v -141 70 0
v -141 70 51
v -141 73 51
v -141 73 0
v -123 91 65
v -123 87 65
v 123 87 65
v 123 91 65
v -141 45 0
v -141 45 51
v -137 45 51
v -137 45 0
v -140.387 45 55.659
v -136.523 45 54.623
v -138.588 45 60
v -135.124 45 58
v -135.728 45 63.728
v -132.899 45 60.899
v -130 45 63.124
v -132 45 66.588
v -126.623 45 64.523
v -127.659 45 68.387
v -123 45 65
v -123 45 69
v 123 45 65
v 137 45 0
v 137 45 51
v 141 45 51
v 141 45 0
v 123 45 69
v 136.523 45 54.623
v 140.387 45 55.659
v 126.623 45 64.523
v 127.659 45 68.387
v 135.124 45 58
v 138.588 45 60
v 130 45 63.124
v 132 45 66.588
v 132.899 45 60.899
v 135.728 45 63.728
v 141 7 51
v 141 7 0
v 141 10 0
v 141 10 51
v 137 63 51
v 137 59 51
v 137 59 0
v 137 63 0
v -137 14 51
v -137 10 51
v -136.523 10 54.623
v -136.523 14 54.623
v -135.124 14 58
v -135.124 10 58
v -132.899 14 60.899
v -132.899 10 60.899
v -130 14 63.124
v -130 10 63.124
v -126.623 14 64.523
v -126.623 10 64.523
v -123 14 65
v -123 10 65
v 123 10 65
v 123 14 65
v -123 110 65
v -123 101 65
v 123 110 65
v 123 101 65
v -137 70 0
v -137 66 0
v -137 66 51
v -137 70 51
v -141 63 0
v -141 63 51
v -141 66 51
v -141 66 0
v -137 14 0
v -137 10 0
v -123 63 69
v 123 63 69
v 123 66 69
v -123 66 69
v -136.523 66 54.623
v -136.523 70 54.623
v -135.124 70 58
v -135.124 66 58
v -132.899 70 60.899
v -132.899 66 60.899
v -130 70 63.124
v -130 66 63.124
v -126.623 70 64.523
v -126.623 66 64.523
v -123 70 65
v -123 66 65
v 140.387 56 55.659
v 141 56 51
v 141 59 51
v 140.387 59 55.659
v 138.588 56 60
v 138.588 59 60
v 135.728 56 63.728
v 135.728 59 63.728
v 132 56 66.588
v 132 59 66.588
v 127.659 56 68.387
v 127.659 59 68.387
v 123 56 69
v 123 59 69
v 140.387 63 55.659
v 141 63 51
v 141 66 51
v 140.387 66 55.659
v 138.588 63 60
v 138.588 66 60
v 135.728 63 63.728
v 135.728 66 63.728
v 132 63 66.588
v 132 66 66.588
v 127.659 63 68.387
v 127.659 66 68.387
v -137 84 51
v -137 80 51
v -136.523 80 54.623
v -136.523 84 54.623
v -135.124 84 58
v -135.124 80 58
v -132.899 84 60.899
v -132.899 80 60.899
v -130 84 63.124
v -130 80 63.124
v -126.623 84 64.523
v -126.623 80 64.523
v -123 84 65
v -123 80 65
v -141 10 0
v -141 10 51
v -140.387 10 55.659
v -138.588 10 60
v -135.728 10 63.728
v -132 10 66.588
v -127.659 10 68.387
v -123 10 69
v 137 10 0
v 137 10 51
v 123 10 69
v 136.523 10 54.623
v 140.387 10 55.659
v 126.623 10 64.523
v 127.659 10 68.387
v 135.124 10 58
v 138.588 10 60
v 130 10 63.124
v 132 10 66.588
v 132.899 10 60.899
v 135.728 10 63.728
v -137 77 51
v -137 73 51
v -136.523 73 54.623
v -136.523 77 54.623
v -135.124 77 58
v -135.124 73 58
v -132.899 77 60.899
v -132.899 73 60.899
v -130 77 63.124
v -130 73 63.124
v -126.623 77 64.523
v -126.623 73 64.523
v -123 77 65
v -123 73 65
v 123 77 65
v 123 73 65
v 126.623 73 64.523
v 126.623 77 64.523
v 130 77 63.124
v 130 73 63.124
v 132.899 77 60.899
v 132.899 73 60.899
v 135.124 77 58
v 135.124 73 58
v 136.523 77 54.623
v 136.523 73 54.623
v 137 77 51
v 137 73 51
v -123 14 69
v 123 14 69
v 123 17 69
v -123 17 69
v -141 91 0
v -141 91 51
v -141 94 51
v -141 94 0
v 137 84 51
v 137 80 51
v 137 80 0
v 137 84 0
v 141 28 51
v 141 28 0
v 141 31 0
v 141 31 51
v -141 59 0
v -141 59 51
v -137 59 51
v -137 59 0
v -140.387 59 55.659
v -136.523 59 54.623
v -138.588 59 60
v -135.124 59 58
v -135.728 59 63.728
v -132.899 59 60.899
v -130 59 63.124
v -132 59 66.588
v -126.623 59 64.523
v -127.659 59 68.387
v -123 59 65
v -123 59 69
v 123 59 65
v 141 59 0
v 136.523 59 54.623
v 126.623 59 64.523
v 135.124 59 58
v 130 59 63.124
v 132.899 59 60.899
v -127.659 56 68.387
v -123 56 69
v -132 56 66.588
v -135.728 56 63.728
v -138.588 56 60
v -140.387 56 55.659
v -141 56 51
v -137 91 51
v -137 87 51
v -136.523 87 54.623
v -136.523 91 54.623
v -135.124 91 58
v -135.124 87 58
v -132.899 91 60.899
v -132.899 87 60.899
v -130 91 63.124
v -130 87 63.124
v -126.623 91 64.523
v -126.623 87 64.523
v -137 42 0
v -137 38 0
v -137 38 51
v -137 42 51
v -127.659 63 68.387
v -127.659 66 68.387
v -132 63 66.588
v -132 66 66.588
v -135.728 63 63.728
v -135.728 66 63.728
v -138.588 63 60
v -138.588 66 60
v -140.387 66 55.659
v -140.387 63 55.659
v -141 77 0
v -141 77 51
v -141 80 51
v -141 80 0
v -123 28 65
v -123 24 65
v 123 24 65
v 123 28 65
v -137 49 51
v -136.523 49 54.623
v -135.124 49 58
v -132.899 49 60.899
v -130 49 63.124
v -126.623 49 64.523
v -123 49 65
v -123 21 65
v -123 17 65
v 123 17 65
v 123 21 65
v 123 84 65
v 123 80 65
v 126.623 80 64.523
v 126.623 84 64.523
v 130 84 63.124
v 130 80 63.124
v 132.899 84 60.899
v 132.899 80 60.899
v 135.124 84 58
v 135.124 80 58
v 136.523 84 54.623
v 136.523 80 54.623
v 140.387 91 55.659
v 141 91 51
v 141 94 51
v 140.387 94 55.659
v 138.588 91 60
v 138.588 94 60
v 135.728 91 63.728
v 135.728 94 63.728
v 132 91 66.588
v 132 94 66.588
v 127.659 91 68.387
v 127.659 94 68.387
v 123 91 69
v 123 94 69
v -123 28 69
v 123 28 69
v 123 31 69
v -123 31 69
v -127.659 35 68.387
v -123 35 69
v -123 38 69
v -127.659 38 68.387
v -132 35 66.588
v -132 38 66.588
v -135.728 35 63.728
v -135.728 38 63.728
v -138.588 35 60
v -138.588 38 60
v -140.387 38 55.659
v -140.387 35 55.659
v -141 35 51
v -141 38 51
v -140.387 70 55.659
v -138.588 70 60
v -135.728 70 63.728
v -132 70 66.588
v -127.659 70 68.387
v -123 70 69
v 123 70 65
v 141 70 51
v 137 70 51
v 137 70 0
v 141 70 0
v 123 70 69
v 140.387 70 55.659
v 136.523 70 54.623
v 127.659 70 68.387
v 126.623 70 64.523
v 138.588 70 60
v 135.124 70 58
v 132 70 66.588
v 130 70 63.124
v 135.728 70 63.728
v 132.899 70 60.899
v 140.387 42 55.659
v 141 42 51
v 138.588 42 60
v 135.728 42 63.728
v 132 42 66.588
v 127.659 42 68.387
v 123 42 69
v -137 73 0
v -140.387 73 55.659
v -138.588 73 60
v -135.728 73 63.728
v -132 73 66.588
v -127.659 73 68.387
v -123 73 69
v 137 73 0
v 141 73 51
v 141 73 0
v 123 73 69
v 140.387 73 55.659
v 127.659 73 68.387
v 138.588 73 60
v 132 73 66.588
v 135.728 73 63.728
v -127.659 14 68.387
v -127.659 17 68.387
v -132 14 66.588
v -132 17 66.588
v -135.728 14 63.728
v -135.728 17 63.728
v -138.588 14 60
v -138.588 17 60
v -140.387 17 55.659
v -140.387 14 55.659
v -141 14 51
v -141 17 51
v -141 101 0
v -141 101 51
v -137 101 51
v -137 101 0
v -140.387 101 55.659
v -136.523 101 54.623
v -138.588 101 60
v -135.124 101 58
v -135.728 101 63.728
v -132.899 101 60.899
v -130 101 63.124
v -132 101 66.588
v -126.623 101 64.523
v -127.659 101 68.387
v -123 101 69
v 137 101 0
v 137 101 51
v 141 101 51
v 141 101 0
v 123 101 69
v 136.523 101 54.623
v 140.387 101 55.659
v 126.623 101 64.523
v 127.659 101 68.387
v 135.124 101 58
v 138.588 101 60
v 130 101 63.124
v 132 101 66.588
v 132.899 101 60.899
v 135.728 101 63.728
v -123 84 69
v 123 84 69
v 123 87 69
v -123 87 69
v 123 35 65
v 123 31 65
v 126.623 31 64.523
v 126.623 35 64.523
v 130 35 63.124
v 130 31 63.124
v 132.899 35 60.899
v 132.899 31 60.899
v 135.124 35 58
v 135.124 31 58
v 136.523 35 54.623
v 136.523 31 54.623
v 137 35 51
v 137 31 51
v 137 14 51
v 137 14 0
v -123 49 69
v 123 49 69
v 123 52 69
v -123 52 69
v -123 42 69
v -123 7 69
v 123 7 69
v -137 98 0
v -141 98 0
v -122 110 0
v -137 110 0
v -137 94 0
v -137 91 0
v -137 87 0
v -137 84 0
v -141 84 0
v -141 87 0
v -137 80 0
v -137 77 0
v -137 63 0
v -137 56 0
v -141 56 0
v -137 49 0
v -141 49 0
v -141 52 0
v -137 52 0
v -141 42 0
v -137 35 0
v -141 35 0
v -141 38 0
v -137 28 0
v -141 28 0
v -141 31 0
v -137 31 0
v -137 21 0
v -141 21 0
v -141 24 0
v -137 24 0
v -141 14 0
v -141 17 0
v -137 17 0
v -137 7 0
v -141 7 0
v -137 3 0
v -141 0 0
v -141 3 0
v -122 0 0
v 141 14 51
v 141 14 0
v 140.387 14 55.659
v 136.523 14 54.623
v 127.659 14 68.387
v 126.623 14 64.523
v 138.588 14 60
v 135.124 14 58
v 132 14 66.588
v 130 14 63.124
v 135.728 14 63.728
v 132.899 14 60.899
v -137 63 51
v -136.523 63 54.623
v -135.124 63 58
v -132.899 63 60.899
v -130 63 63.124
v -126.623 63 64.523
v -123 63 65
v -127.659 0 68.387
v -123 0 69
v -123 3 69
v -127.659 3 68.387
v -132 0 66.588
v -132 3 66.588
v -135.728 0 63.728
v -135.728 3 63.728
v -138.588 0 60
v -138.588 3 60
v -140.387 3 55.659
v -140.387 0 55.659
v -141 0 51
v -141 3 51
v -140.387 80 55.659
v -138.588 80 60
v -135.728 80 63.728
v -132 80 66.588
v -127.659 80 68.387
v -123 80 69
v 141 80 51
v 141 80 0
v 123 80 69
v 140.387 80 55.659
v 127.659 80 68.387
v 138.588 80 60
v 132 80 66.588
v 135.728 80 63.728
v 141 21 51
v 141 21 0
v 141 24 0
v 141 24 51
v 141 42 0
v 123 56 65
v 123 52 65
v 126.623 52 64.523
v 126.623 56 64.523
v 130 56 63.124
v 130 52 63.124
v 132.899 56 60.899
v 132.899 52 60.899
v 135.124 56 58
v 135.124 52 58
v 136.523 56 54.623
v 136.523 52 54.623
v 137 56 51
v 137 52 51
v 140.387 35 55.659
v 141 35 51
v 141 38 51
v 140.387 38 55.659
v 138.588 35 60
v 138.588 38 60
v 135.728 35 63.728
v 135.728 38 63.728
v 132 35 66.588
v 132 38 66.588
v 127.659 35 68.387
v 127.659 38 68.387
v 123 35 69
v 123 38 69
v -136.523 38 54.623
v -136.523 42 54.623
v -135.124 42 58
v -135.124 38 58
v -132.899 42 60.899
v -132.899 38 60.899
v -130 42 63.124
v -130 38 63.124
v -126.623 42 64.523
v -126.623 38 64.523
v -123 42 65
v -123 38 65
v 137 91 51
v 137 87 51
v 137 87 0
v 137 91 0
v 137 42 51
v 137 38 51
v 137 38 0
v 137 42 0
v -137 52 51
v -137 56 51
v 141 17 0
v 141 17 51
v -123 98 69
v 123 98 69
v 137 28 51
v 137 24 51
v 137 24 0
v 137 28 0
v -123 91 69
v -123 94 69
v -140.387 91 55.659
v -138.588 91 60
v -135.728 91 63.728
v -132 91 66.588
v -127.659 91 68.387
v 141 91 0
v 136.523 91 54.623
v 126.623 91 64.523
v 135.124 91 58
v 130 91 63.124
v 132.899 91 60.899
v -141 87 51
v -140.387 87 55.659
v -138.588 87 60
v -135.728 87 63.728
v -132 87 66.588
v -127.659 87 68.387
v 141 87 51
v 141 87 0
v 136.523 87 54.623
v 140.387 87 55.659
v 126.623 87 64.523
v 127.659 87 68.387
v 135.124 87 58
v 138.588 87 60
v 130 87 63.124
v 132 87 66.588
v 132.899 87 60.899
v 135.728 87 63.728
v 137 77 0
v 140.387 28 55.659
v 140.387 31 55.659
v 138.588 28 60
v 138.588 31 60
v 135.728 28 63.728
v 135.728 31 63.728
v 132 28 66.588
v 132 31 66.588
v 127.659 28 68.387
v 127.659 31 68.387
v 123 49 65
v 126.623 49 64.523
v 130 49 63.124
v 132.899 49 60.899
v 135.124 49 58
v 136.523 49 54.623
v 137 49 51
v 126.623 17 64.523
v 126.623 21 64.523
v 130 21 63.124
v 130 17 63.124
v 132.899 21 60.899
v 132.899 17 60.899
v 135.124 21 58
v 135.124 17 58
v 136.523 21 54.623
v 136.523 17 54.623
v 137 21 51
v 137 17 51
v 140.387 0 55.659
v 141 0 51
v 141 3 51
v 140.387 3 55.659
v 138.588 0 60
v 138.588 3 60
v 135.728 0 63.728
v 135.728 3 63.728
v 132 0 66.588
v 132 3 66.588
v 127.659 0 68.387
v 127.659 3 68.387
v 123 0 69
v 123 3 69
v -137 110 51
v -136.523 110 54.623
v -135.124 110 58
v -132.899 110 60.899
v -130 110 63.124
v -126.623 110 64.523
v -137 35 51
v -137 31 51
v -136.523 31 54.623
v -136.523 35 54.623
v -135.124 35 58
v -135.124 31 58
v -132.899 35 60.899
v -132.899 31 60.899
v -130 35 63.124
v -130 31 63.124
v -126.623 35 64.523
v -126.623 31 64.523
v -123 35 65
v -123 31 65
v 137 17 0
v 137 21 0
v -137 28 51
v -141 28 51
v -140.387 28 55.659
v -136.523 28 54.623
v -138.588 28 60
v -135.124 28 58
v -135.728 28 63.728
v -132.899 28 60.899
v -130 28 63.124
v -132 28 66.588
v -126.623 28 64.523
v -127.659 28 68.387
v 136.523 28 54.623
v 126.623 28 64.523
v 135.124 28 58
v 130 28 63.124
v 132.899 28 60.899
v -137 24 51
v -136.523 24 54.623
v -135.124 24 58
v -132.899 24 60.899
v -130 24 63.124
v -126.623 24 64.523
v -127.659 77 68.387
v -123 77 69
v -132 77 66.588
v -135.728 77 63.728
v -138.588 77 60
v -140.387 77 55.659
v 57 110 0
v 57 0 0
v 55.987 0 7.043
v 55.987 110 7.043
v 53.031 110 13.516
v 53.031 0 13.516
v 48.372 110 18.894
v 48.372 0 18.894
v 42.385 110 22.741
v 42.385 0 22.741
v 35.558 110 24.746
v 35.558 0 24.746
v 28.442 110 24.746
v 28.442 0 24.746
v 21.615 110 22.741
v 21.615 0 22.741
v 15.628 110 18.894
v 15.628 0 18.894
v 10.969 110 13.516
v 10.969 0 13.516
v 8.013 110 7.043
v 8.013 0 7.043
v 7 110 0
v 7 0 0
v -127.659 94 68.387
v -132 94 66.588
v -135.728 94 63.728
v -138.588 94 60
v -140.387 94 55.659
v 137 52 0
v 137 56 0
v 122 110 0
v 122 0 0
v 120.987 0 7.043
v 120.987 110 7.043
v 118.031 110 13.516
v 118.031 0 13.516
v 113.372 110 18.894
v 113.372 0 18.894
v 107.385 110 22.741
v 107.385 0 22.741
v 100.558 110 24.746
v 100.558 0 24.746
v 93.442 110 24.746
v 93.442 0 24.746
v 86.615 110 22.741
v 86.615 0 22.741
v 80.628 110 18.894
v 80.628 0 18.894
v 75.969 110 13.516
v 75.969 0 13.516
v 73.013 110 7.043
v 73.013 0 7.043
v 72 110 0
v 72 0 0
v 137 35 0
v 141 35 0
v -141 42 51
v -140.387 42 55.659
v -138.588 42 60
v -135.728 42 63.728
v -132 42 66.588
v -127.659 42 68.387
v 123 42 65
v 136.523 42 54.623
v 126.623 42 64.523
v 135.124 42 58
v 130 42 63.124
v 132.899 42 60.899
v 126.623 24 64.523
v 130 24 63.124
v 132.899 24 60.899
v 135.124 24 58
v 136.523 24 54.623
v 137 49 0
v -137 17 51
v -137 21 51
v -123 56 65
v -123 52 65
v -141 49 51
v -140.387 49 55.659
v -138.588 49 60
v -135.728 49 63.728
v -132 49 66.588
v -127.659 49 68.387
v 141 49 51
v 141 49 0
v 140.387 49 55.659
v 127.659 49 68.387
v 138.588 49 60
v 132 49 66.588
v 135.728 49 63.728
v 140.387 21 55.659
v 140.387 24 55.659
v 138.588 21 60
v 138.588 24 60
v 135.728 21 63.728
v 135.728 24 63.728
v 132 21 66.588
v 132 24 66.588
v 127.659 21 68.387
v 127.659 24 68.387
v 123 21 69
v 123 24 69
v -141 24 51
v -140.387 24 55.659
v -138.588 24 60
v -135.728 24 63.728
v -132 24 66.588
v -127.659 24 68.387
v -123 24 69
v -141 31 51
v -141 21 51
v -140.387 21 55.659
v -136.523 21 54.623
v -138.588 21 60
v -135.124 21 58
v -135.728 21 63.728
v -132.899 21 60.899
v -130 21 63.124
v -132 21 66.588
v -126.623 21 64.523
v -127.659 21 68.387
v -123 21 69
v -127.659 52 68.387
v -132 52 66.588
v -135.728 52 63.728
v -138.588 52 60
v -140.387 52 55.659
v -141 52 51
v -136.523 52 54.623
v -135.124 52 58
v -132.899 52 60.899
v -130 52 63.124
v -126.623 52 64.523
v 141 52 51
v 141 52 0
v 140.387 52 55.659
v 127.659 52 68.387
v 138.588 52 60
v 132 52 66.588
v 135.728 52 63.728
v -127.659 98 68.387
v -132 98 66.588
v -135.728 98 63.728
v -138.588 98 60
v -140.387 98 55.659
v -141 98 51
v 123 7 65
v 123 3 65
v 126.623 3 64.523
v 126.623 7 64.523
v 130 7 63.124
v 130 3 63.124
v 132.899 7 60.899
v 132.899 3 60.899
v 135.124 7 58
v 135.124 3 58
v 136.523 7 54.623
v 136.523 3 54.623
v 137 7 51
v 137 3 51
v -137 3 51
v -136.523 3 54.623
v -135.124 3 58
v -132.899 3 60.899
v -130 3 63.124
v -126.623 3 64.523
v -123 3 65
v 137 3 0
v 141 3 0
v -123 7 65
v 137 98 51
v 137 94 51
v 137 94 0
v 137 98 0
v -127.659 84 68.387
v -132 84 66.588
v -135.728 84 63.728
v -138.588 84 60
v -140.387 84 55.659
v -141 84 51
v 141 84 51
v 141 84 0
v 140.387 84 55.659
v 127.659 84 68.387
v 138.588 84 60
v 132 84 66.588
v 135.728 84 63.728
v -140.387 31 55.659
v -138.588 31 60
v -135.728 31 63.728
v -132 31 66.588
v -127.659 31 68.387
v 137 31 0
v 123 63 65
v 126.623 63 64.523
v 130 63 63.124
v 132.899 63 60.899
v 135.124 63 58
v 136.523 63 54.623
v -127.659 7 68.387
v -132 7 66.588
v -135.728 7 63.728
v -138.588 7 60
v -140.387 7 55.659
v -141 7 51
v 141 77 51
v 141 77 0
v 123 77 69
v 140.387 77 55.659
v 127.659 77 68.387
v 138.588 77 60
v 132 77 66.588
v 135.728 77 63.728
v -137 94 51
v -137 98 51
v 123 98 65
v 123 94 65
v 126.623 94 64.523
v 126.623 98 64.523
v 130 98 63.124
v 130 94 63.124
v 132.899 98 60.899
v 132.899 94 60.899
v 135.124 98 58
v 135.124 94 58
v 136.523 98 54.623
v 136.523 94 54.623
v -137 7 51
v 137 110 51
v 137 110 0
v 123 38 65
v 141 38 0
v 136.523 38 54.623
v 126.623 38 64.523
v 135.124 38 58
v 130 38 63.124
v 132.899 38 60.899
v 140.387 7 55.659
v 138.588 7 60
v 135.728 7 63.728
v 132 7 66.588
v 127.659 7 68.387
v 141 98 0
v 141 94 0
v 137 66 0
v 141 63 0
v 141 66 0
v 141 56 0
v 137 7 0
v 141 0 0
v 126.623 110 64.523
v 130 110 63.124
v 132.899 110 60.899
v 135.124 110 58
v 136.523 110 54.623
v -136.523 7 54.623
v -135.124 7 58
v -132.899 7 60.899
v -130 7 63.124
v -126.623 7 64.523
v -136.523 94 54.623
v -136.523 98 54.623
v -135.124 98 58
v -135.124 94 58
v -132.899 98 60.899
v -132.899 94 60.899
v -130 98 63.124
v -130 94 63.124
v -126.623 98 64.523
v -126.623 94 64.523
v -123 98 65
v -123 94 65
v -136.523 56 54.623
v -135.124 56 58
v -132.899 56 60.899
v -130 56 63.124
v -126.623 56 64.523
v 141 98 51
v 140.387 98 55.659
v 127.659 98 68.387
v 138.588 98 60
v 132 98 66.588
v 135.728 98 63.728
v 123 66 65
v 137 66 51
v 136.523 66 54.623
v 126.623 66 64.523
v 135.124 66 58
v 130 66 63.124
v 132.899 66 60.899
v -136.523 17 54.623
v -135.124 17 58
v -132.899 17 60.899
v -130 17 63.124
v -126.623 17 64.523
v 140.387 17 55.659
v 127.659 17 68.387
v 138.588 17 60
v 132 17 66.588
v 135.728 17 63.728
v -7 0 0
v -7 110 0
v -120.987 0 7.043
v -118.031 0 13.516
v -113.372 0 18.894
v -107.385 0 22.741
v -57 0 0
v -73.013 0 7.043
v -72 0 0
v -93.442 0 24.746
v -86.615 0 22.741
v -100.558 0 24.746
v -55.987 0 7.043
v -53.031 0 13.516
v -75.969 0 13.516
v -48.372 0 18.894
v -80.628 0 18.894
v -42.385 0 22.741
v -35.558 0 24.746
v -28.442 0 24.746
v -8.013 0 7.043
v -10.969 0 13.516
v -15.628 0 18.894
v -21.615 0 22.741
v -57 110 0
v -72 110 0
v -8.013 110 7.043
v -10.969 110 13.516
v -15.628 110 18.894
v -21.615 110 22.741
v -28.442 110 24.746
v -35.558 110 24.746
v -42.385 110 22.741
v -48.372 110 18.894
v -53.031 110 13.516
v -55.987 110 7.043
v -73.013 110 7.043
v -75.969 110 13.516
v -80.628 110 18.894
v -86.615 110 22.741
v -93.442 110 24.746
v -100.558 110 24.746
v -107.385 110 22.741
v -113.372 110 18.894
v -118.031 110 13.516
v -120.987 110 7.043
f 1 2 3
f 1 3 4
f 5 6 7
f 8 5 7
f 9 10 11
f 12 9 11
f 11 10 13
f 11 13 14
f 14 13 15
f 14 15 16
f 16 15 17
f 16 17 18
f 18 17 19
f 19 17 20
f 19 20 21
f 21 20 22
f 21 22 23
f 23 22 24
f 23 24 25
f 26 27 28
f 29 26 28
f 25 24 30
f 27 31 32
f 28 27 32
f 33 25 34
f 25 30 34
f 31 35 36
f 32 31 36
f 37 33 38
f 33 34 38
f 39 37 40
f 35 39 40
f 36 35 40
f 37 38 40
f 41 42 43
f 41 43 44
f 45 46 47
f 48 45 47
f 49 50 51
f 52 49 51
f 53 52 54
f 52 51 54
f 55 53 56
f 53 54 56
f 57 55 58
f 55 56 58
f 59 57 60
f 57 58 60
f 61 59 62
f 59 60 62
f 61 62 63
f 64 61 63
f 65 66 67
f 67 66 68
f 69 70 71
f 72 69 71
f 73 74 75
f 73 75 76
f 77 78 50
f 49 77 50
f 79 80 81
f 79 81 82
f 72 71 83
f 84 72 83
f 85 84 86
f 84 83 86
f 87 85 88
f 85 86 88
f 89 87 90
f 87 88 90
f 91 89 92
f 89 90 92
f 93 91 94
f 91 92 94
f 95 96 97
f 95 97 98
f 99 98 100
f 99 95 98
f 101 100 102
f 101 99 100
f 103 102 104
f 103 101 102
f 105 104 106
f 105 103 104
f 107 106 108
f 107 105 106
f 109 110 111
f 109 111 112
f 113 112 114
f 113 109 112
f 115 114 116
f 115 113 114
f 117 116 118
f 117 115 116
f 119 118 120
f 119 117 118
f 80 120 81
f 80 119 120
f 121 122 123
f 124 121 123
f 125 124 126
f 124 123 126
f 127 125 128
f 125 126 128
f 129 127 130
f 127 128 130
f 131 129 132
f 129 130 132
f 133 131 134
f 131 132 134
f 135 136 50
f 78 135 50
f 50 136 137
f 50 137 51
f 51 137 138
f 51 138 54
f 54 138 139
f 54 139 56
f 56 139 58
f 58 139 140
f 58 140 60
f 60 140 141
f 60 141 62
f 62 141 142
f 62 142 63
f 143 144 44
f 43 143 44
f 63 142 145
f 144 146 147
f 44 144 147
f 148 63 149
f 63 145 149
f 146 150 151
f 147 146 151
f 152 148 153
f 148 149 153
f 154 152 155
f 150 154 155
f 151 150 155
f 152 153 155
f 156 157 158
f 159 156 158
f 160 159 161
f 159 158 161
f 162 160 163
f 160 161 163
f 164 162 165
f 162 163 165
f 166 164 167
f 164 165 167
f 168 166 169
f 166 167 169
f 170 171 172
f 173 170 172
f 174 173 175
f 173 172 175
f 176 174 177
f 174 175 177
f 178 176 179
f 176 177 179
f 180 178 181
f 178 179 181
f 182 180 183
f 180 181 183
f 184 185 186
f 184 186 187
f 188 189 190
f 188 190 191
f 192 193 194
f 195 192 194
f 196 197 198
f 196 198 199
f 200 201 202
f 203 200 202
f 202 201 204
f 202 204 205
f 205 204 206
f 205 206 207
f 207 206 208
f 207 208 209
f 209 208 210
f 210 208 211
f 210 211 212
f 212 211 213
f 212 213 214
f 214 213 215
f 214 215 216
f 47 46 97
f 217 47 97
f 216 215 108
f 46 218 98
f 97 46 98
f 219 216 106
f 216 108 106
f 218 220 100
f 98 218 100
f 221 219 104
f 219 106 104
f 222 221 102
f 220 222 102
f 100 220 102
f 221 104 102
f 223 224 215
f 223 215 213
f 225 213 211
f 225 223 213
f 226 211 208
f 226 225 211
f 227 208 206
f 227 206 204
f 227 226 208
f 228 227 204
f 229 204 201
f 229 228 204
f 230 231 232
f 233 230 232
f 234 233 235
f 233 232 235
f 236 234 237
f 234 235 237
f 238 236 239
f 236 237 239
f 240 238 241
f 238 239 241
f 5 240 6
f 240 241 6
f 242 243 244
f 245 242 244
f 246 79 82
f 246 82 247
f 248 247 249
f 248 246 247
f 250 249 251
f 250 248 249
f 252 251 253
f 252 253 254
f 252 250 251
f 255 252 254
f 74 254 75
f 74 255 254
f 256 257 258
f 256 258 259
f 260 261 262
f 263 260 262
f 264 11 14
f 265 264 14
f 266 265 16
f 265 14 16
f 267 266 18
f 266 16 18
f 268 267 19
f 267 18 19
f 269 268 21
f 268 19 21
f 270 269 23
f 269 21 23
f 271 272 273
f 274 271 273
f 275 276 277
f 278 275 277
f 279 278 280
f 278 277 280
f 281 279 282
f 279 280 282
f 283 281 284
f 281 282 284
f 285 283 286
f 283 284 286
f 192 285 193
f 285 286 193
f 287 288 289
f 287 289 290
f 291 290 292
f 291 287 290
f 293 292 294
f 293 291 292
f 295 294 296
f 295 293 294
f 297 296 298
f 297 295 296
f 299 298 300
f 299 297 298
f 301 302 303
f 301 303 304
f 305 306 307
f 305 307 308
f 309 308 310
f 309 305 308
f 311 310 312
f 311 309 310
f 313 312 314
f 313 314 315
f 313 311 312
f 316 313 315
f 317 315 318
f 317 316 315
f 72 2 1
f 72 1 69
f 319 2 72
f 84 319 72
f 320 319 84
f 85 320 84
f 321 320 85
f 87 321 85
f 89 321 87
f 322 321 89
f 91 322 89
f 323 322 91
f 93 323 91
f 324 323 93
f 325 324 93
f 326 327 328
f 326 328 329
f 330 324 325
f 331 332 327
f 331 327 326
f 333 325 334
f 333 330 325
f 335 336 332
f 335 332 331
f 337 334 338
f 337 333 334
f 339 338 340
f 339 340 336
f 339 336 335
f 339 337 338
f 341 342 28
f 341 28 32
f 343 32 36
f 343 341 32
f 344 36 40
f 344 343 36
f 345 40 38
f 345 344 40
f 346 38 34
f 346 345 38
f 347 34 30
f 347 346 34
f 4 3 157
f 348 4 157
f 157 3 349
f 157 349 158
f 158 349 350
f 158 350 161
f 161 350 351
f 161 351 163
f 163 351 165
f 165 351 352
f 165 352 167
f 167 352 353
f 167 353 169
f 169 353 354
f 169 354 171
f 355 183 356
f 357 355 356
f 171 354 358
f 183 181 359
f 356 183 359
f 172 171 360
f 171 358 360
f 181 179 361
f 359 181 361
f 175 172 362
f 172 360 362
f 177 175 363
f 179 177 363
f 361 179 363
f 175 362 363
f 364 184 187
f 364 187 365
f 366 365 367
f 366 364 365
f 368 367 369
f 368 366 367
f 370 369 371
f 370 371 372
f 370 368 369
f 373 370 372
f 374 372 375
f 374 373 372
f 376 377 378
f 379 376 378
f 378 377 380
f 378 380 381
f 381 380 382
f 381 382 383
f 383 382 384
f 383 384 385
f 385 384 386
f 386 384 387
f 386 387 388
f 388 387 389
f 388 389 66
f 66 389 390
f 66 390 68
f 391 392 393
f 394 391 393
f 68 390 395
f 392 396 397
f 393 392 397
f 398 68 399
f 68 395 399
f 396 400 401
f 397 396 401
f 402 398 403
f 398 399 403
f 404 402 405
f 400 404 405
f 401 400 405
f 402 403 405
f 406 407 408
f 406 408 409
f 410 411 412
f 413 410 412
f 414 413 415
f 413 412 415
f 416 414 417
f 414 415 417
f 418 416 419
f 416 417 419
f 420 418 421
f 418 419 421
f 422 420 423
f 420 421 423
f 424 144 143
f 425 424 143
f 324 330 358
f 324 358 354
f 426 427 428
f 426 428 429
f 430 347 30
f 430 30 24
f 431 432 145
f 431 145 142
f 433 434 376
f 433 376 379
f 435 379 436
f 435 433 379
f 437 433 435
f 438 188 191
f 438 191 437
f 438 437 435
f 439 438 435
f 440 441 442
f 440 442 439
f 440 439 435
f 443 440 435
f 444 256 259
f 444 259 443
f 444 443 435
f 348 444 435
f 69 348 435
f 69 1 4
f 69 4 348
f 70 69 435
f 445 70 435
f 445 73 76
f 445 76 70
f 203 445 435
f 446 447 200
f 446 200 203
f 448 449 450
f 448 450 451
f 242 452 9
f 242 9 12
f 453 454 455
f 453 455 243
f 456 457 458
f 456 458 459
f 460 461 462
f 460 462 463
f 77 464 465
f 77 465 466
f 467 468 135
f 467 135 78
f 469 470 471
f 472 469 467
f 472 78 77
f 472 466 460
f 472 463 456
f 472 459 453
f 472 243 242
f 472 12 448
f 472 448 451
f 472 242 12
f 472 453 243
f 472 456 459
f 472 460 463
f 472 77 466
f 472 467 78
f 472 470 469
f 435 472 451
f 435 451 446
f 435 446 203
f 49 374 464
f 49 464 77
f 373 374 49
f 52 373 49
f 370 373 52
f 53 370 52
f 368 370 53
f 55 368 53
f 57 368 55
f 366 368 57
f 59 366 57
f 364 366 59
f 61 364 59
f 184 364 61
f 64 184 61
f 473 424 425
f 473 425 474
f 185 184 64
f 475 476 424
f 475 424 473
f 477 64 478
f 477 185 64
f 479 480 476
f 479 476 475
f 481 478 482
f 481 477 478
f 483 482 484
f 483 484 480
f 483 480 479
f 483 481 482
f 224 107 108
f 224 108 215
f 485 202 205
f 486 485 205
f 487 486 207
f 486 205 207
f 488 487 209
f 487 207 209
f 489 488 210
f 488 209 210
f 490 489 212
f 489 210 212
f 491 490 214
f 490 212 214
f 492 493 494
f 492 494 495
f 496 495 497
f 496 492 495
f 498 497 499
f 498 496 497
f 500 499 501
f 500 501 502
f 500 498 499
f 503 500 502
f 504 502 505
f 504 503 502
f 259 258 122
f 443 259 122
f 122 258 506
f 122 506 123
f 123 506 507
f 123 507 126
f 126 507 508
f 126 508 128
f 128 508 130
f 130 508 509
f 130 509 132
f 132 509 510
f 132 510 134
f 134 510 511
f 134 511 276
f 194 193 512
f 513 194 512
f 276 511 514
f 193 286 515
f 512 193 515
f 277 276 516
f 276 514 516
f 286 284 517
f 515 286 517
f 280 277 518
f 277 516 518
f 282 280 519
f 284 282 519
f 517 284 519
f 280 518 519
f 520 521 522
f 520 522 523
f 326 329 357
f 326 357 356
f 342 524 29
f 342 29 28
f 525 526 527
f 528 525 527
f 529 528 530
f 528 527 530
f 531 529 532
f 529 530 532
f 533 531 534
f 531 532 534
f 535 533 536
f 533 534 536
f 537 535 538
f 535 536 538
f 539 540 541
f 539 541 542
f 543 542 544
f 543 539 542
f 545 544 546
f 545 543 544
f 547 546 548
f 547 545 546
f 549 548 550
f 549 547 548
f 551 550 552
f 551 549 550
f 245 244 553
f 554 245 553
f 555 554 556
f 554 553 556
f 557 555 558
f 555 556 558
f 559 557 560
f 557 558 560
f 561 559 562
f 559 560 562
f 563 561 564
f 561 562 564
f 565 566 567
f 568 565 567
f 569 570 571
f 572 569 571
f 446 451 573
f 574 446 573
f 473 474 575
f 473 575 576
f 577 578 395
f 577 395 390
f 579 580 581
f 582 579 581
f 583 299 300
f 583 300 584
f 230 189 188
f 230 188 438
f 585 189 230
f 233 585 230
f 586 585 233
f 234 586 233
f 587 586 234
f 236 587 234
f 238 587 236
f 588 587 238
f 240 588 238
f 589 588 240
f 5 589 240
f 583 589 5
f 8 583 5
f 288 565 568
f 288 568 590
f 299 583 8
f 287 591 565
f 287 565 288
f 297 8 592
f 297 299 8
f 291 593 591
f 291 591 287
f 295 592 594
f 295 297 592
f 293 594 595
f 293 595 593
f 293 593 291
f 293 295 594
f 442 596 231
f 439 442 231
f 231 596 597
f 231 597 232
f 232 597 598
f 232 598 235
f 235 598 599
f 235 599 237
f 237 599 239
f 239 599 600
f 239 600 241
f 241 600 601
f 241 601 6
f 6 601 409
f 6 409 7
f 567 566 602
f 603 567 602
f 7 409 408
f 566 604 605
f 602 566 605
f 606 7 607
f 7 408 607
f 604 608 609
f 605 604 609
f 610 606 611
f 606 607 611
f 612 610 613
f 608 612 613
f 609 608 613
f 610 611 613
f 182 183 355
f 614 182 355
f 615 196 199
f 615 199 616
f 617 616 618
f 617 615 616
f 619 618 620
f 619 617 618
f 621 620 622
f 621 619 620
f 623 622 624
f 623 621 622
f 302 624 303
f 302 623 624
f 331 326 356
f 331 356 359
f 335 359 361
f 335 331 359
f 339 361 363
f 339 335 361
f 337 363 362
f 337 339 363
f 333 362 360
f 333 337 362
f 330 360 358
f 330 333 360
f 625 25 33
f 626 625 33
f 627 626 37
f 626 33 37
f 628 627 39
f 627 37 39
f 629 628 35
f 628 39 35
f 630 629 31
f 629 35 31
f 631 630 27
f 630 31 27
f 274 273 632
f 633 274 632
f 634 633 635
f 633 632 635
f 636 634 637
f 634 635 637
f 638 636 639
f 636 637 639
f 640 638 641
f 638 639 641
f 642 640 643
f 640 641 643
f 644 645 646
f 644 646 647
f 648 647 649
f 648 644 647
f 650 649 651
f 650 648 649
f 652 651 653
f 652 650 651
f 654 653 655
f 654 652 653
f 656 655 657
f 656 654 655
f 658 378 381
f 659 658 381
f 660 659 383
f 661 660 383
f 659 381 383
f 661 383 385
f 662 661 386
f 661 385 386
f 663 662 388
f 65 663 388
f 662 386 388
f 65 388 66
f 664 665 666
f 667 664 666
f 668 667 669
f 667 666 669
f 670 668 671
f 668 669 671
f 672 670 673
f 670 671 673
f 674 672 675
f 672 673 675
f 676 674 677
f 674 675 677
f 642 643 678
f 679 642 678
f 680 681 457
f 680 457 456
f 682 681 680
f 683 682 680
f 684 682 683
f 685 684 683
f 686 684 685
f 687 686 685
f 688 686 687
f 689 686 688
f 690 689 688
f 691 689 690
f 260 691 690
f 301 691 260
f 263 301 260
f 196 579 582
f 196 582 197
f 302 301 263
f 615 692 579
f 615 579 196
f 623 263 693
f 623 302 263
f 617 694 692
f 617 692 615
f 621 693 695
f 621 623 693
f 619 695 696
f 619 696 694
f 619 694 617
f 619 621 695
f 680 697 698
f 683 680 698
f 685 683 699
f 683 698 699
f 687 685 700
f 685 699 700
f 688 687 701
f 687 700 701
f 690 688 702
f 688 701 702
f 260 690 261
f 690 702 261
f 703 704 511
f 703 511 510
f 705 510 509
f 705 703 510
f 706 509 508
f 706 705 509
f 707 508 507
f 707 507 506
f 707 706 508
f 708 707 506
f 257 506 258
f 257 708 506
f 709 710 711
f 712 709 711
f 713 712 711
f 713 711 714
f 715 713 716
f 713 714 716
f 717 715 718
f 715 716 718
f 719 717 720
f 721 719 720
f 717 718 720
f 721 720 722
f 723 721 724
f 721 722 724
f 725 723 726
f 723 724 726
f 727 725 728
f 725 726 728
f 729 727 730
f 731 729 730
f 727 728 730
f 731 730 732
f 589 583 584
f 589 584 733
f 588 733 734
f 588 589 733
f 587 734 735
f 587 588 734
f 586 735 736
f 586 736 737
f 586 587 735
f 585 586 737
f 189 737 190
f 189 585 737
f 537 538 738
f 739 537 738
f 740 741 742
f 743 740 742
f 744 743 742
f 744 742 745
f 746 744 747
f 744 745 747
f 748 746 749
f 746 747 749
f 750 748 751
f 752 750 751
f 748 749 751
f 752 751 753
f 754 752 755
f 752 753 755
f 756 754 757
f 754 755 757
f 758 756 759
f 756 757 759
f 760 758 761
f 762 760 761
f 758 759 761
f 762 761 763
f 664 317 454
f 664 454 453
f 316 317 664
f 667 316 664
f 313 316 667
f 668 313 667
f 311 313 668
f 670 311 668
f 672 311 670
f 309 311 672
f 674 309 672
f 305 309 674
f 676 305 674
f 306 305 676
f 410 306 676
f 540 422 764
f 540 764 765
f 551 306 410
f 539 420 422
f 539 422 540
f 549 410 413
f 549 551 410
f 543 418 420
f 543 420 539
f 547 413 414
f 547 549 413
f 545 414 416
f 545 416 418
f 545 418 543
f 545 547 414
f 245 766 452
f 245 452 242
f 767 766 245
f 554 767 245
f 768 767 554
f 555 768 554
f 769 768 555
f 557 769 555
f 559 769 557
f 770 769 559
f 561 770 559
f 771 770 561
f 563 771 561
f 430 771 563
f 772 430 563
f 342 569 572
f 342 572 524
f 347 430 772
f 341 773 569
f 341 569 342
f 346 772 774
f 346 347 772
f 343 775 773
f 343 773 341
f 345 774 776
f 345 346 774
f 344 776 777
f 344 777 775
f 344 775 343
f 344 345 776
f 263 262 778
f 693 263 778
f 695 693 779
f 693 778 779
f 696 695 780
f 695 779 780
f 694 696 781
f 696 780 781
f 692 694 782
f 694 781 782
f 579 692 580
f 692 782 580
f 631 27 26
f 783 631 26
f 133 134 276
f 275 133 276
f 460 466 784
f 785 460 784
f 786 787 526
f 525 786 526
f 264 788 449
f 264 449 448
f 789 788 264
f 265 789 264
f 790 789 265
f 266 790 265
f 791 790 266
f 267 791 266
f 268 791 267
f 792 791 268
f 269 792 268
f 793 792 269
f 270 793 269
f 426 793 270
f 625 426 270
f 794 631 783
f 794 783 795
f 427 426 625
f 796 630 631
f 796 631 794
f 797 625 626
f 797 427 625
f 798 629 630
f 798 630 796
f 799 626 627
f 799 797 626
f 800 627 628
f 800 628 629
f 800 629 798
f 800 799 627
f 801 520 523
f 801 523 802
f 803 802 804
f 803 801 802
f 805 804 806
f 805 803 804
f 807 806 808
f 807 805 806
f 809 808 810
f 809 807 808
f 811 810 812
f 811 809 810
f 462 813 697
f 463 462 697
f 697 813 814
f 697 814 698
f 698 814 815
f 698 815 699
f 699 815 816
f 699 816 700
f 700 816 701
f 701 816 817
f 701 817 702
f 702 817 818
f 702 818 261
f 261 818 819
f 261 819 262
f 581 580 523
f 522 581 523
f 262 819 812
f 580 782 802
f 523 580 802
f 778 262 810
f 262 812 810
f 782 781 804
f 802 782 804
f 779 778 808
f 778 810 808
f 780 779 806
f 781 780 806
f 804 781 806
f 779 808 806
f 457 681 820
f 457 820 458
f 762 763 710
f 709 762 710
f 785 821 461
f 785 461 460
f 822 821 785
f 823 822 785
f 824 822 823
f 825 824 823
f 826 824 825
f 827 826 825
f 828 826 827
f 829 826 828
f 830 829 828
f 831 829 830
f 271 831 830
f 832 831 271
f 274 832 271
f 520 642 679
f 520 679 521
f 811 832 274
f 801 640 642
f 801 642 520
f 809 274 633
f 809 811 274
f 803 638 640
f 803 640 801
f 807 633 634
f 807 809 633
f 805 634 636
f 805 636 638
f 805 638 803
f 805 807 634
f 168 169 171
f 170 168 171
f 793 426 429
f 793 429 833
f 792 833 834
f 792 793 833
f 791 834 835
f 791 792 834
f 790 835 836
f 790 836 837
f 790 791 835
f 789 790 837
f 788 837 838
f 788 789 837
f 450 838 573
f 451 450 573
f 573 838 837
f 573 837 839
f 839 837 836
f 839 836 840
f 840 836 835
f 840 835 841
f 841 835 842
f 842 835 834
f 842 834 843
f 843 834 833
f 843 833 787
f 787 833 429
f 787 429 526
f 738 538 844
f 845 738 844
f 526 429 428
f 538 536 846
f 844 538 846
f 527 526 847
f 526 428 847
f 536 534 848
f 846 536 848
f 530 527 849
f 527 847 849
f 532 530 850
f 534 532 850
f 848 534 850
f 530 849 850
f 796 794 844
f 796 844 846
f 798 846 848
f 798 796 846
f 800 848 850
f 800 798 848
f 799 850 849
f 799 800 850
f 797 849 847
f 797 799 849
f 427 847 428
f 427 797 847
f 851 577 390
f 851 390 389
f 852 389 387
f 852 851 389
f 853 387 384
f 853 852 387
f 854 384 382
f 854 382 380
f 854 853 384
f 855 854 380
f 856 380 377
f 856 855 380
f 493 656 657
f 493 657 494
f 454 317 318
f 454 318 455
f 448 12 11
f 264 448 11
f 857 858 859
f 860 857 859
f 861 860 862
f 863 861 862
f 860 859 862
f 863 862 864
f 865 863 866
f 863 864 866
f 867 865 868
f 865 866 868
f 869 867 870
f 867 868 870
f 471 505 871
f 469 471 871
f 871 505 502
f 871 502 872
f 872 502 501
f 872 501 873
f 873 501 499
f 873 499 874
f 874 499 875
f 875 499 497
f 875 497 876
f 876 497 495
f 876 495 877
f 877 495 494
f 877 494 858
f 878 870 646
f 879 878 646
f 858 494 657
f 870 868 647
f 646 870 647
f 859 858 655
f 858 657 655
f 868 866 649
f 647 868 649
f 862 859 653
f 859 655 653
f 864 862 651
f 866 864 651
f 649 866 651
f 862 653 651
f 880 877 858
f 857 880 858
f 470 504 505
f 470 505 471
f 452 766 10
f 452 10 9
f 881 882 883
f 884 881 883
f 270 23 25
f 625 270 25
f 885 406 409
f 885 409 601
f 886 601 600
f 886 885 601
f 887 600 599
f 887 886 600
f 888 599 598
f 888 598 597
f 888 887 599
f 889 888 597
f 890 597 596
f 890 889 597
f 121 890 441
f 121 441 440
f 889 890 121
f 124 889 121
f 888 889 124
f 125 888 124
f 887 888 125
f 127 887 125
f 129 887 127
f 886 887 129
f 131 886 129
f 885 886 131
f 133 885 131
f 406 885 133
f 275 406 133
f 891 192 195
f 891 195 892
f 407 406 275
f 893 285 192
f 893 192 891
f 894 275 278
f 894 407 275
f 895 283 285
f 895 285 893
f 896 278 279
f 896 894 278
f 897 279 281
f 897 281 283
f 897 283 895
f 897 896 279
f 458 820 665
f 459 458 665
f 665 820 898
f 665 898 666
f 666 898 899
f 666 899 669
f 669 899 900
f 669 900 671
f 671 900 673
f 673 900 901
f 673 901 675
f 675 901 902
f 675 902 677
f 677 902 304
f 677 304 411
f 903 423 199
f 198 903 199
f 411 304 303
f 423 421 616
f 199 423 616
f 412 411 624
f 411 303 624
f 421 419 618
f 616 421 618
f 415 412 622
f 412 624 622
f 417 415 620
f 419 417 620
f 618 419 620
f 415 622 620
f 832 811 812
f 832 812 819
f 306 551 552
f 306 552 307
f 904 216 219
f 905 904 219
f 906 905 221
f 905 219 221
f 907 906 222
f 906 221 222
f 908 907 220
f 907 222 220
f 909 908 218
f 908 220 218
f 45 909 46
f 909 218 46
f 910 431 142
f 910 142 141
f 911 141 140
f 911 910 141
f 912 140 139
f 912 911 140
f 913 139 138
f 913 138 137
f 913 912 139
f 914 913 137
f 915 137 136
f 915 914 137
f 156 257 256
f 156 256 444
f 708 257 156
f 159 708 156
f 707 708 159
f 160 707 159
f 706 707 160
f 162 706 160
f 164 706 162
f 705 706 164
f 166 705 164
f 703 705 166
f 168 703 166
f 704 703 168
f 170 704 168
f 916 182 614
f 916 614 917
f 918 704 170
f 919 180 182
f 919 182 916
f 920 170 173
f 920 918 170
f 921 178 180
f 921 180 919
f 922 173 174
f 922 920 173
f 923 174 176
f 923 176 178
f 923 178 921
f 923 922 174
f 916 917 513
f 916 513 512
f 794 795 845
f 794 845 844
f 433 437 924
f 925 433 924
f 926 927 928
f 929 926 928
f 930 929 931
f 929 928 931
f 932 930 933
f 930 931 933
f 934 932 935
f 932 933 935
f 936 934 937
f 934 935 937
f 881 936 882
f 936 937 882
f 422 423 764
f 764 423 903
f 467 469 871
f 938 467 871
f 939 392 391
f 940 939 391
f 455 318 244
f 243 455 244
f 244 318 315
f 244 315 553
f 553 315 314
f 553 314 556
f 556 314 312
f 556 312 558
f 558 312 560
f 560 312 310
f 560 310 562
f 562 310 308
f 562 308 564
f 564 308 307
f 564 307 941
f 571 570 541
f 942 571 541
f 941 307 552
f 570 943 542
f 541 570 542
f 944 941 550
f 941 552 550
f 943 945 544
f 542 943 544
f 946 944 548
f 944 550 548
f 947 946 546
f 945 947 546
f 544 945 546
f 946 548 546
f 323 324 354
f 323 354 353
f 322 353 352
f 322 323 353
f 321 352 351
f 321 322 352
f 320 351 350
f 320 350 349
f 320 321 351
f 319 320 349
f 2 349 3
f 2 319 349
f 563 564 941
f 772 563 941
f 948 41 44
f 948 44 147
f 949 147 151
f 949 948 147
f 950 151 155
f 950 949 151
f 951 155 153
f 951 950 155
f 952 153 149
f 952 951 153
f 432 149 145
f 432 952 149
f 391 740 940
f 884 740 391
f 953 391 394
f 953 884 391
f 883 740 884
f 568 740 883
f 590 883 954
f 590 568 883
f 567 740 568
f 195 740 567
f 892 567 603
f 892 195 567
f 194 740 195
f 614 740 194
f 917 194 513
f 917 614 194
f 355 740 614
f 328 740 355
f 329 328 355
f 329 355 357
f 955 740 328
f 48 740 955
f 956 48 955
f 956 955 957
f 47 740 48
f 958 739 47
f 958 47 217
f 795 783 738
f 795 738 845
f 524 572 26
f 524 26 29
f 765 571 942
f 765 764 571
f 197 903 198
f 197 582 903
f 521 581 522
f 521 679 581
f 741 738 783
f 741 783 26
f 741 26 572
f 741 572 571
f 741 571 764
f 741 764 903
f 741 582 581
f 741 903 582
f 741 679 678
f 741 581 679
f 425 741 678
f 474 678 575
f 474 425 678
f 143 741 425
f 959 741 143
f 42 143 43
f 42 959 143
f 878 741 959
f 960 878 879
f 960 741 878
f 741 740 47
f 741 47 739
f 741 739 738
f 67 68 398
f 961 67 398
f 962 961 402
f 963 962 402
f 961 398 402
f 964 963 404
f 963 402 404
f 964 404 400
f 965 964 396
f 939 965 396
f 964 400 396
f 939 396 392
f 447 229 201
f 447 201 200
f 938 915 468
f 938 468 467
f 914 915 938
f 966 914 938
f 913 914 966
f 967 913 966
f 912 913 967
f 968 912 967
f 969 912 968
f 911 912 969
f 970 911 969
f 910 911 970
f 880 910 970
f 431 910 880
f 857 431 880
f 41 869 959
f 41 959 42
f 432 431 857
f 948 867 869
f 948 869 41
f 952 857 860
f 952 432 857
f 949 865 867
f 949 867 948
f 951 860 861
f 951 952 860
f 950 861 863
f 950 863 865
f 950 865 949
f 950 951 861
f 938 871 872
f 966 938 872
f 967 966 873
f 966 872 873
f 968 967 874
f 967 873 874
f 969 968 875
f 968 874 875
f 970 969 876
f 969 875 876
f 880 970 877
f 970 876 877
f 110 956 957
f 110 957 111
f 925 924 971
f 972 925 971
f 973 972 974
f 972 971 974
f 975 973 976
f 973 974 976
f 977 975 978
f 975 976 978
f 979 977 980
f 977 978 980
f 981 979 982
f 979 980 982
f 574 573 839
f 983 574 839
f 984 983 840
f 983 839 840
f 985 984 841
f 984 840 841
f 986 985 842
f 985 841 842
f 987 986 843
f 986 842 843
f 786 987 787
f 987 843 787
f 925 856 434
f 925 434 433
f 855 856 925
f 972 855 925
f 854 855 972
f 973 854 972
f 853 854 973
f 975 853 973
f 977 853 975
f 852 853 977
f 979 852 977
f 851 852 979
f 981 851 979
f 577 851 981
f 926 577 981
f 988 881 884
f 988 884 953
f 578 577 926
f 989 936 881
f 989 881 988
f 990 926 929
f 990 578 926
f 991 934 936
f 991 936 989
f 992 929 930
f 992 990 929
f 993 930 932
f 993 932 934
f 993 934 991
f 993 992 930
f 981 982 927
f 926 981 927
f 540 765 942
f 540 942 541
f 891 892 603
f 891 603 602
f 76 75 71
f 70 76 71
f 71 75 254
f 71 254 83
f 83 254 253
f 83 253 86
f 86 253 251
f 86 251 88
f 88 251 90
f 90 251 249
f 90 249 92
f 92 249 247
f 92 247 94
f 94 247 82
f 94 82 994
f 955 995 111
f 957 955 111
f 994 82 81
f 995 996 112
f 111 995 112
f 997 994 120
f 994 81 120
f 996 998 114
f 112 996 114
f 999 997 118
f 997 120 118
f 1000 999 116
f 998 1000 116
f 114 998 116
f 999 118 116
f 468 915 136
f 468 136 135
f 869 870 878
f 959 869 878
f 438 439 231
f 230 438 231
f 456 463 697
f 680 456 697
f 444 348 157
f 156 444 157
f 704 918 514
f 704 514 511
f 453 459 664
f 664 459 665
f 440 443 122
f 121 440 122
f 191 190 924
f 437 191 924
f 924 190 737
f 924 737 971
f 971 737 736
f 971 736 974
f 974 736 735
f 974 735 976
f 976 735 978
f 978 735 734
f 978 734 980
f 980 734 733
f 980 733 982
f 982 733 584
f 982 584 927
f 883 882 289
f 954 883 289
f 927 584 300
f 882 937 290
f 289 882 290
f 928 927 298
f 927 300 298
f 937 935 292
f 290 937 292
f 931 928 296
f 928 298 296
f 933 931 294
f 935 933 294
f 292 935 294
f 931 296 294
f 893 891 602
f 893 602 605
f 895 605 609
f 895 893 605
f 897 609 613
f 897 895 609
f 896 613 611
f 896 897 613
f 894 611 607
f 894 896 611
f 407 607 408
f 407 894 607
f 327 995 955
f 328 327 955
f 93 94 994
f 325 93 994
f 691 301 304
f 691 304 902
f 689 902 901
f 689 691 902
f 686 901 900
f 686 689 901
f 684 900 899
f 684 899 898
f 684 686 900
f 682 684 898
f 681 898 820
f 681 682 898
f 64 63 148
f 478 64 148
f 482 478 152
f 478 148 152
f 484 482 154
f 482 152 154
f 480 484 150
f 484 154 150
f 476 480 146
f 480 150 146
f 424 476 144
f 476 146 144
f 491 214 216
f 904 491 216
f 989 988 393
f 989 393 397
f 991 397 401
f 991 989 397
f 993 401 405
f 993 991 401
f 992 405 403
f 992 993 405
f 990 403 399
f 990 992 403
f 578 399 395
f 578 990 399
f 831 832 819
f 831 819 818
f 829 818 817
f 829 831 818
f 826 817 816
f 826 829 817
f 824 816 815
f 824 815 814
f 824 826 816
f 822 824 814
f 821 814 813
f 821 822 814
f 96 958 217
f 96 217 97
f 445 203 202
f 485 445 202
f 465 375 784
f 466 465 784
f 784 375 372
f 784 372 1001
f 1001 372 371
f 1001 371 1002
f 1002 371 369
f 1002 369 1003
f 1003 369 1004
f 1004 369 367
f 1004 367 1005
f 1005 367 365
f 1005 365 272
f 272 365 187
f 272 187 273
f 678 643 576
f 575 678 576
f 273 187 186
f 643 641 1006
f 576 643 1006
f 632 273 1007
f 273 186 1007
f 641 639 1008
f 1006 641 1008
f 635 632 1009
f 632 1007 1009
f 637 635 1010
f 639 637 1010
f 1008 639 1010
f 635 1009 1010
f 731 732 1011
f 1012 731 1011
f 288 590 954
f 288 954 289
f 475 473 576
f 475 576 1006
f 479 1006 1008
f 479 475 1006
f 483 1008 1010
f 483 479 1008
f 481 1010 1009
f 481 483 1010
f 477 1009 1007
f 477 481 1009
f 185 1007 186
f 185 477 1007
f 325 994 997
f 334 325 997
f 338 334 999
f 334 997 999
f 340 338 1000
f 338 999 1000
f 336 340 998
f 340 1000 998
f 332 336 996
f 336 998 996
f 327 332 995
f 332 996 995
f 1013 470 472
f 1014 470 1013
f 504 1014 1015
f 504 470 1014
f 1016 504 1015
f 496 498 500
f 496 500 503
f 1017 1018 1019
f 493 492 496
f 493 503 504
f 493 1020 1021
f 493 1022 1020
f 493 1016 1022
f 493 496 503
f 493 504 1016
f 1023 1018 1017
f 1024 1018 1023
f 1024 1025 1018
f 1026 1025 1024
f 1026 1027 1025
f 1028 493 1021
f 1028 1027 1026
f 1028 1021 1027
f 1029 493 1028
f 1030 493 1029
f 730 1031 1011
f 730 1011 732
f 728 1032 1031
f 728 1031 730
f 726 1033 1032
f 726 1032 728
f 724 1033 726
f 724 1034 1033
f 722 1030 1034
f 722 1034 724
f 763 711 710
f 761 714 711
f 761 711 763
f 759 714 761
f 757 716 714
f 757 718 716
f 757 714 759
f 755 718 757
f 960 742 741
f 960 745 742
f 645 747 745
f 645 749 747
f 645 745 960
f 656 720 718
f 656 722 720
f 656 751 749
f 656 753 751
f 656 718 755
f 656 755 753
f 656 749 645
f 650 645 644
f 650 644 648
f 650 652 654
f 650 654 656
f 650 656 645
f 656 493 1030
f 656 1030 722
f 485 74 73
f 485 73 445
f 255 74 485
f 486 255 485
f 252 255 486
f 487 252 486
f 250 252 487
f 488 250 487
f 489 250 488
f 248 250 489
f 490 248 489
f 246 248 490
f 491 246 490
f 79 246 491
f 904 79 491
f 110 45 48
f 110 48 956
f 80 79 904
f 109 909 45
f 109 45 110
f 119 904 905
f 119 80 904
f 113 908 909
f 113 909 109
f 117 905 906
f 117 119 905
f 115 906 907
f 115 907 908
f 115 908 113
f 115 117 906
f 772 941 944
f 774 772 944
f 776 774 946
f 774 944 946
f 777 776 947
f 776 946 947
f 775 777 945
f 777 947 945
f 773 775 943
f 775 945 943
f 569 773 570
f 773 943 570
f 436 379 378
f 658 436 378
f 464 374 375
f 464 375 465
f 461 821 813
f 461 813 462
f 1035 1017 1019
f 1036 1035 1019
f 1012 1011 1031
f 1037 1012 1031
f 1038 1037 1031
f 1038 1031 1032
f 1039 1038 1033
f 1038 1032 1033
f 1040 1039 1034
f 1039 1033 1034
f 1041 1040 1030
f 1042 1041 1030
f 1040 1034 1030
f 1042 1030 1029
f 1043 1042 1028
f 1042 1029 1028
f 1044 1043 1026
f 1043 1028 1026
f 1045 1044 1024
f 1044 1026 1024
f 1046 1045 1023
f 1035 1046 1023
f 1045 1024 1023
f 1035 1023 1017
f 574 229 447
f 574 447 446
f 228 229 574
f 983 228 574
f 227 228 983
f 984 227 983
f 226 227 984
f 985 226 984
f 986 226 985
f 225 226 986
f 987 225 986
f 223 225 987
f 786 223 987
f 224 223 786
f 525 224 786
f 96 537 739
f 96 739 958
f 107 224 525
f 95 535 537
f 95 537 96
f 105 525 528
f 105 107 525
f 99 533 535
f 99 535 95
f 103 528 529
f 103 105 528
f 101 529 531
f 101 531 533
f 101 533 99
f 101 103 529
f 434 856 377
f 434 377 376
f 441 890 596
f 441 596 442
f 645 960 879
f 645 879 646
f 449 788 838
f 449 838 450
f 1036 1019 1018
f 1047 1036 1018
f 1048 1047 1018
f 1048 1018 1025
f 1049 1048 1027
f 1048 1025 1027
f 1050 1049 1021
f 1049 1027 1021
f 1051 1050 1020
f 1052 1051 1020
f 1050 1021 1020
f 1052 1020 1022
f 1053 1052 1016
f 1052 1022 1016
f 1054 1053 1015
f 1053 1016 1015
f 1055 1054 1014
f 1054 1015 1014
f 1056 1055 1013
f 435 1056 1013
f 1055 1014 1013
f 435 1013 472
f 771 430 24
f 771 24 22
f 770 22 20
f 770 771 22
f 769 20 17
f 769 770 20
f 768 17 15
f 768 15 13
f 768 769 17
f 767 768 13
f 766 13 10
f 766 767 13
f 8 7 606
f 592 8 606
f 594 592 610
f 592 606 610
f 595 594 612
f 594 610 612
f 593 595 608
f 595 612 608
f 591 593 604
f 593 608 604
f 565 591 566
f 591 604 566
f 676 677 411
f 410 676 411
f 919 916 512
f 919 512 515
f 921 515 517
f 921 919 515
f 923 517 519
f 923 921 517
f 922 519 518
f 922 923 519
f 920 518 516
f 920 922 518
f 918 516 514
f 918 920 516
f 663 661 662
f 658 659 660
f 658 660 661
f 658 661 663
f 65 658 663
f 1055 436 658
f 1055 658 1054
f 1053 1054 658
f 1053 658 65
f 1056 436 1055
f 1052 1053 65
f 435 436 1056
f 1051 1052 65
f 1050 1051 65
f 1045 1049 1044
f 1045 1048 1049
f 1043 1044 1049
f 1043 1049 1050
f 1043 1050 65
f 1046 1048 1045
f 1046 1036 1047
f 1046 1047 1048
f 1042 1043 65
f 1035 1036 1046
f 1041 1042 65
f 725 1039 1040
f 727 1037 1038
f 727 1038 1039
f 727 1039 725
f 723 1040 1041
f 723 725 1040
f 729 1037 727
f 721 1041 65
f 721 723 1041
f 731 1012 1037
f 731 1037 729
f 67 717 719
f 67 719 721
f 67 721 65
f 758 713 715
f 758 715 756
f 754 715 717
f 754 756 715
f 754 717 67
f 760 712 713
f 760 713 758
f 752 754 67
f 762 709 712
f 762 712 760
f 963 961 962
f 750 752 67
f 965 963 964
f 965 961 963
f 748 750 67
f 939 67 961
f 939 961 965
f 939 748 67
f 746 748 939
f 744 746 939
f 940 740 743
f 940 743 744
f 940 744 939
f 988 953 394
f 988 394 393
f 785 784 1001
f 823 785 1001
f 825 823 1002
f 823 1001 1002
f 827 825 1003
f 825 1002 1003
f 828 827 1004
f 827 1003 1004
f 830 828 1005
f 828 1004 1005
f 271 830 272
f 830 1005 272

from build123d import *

# Parameters (mm, degrees)
BOSS_EXTRUDE1_DEPTH = 110
BOSS_EXTRUDE2_DEPTH = 3
LPATTERN5_COUNT     = 15
LPATTERN5_PITCH     = 7


with BuildPart() as part:
    # Sketch1 → Boss-Extrude1 (new body)
    with BuildSketch(Plane(origin=(0, 0, 0), x_dir=(1, 0, 0), z_dir=(0, 1, 0))):
        with BuildLine():
            ThreePointArc((57, 0), (32, -25), (7, 0))
            Line((7, 0), (-7, 0))
            ThreePointArc((-7, 0), (-32, -25), (-57, 0))
            Line((-57, 0), (-72, 0))
            ThreePointArc((-72, 0), (-97, -25), (-122, 0))
            Line((-122, 0), (-137, 0))
            Line((-137, 0), (-137, -51))
            ThreePointArc((-137, -51), (-132.899494937, -60.899494937), (-123, -65))
            Line((-123, -65), (123, -65))
            ThreePointArc((123, -65), (132.899494937, -60.899494937), (137, -51))
            Line((137, -51), (137, 0))
            Line((137, 0), (122, 0))
            ThreePointArc((122, 0), (97, -25), (72, 0))
            Line((72, 0), (57, 0))
        make_face()
    extrude(amount=BOSS_EXTRUDE1_DEPTH)

    # Sketch2 → Boss-Extrude2 (add)
    with BuildSketch(Plane.XZ):
        with BuildLine():
            Line((123, 69), (-123, 69))
            ThreePointArc((-123, 69), (-135.727922061, 63.727922061), (-141, 51))
            Line((-141, 51), (-141, 0))
            Line((-141, 0), (-137, 0))
            Line((-137, 0), (-137, 51))
            ThreePointArc((-137, 51), (-132.899494937, 60.899494937), (-123, 65))
            Line((-123, 65), (123, 65))
            ThreePointArc((123, 65), (132.899494937, 60.899494937), (137, 51))
            Line((137, 51), (137, 0))
            Line((137, 0), (141, 0))
            Line((141, 0), (141, 51))
            ThreePointArc((141, 51), (135.727922061, 63.727922061), (123, 69))
        make_face()
    boss_extrude2 = extrude(amount=-BOSS_EXTRUDE2_DEPTH)

    # LPattern5: Boss-Extrude2 ×15
    with Locations(*[(0, i * LPATTERN5_PITCH, 0) for i in range(1, LPATTERN5_COUNT)]):
        add(boss_extrude2)


solid = part.part
